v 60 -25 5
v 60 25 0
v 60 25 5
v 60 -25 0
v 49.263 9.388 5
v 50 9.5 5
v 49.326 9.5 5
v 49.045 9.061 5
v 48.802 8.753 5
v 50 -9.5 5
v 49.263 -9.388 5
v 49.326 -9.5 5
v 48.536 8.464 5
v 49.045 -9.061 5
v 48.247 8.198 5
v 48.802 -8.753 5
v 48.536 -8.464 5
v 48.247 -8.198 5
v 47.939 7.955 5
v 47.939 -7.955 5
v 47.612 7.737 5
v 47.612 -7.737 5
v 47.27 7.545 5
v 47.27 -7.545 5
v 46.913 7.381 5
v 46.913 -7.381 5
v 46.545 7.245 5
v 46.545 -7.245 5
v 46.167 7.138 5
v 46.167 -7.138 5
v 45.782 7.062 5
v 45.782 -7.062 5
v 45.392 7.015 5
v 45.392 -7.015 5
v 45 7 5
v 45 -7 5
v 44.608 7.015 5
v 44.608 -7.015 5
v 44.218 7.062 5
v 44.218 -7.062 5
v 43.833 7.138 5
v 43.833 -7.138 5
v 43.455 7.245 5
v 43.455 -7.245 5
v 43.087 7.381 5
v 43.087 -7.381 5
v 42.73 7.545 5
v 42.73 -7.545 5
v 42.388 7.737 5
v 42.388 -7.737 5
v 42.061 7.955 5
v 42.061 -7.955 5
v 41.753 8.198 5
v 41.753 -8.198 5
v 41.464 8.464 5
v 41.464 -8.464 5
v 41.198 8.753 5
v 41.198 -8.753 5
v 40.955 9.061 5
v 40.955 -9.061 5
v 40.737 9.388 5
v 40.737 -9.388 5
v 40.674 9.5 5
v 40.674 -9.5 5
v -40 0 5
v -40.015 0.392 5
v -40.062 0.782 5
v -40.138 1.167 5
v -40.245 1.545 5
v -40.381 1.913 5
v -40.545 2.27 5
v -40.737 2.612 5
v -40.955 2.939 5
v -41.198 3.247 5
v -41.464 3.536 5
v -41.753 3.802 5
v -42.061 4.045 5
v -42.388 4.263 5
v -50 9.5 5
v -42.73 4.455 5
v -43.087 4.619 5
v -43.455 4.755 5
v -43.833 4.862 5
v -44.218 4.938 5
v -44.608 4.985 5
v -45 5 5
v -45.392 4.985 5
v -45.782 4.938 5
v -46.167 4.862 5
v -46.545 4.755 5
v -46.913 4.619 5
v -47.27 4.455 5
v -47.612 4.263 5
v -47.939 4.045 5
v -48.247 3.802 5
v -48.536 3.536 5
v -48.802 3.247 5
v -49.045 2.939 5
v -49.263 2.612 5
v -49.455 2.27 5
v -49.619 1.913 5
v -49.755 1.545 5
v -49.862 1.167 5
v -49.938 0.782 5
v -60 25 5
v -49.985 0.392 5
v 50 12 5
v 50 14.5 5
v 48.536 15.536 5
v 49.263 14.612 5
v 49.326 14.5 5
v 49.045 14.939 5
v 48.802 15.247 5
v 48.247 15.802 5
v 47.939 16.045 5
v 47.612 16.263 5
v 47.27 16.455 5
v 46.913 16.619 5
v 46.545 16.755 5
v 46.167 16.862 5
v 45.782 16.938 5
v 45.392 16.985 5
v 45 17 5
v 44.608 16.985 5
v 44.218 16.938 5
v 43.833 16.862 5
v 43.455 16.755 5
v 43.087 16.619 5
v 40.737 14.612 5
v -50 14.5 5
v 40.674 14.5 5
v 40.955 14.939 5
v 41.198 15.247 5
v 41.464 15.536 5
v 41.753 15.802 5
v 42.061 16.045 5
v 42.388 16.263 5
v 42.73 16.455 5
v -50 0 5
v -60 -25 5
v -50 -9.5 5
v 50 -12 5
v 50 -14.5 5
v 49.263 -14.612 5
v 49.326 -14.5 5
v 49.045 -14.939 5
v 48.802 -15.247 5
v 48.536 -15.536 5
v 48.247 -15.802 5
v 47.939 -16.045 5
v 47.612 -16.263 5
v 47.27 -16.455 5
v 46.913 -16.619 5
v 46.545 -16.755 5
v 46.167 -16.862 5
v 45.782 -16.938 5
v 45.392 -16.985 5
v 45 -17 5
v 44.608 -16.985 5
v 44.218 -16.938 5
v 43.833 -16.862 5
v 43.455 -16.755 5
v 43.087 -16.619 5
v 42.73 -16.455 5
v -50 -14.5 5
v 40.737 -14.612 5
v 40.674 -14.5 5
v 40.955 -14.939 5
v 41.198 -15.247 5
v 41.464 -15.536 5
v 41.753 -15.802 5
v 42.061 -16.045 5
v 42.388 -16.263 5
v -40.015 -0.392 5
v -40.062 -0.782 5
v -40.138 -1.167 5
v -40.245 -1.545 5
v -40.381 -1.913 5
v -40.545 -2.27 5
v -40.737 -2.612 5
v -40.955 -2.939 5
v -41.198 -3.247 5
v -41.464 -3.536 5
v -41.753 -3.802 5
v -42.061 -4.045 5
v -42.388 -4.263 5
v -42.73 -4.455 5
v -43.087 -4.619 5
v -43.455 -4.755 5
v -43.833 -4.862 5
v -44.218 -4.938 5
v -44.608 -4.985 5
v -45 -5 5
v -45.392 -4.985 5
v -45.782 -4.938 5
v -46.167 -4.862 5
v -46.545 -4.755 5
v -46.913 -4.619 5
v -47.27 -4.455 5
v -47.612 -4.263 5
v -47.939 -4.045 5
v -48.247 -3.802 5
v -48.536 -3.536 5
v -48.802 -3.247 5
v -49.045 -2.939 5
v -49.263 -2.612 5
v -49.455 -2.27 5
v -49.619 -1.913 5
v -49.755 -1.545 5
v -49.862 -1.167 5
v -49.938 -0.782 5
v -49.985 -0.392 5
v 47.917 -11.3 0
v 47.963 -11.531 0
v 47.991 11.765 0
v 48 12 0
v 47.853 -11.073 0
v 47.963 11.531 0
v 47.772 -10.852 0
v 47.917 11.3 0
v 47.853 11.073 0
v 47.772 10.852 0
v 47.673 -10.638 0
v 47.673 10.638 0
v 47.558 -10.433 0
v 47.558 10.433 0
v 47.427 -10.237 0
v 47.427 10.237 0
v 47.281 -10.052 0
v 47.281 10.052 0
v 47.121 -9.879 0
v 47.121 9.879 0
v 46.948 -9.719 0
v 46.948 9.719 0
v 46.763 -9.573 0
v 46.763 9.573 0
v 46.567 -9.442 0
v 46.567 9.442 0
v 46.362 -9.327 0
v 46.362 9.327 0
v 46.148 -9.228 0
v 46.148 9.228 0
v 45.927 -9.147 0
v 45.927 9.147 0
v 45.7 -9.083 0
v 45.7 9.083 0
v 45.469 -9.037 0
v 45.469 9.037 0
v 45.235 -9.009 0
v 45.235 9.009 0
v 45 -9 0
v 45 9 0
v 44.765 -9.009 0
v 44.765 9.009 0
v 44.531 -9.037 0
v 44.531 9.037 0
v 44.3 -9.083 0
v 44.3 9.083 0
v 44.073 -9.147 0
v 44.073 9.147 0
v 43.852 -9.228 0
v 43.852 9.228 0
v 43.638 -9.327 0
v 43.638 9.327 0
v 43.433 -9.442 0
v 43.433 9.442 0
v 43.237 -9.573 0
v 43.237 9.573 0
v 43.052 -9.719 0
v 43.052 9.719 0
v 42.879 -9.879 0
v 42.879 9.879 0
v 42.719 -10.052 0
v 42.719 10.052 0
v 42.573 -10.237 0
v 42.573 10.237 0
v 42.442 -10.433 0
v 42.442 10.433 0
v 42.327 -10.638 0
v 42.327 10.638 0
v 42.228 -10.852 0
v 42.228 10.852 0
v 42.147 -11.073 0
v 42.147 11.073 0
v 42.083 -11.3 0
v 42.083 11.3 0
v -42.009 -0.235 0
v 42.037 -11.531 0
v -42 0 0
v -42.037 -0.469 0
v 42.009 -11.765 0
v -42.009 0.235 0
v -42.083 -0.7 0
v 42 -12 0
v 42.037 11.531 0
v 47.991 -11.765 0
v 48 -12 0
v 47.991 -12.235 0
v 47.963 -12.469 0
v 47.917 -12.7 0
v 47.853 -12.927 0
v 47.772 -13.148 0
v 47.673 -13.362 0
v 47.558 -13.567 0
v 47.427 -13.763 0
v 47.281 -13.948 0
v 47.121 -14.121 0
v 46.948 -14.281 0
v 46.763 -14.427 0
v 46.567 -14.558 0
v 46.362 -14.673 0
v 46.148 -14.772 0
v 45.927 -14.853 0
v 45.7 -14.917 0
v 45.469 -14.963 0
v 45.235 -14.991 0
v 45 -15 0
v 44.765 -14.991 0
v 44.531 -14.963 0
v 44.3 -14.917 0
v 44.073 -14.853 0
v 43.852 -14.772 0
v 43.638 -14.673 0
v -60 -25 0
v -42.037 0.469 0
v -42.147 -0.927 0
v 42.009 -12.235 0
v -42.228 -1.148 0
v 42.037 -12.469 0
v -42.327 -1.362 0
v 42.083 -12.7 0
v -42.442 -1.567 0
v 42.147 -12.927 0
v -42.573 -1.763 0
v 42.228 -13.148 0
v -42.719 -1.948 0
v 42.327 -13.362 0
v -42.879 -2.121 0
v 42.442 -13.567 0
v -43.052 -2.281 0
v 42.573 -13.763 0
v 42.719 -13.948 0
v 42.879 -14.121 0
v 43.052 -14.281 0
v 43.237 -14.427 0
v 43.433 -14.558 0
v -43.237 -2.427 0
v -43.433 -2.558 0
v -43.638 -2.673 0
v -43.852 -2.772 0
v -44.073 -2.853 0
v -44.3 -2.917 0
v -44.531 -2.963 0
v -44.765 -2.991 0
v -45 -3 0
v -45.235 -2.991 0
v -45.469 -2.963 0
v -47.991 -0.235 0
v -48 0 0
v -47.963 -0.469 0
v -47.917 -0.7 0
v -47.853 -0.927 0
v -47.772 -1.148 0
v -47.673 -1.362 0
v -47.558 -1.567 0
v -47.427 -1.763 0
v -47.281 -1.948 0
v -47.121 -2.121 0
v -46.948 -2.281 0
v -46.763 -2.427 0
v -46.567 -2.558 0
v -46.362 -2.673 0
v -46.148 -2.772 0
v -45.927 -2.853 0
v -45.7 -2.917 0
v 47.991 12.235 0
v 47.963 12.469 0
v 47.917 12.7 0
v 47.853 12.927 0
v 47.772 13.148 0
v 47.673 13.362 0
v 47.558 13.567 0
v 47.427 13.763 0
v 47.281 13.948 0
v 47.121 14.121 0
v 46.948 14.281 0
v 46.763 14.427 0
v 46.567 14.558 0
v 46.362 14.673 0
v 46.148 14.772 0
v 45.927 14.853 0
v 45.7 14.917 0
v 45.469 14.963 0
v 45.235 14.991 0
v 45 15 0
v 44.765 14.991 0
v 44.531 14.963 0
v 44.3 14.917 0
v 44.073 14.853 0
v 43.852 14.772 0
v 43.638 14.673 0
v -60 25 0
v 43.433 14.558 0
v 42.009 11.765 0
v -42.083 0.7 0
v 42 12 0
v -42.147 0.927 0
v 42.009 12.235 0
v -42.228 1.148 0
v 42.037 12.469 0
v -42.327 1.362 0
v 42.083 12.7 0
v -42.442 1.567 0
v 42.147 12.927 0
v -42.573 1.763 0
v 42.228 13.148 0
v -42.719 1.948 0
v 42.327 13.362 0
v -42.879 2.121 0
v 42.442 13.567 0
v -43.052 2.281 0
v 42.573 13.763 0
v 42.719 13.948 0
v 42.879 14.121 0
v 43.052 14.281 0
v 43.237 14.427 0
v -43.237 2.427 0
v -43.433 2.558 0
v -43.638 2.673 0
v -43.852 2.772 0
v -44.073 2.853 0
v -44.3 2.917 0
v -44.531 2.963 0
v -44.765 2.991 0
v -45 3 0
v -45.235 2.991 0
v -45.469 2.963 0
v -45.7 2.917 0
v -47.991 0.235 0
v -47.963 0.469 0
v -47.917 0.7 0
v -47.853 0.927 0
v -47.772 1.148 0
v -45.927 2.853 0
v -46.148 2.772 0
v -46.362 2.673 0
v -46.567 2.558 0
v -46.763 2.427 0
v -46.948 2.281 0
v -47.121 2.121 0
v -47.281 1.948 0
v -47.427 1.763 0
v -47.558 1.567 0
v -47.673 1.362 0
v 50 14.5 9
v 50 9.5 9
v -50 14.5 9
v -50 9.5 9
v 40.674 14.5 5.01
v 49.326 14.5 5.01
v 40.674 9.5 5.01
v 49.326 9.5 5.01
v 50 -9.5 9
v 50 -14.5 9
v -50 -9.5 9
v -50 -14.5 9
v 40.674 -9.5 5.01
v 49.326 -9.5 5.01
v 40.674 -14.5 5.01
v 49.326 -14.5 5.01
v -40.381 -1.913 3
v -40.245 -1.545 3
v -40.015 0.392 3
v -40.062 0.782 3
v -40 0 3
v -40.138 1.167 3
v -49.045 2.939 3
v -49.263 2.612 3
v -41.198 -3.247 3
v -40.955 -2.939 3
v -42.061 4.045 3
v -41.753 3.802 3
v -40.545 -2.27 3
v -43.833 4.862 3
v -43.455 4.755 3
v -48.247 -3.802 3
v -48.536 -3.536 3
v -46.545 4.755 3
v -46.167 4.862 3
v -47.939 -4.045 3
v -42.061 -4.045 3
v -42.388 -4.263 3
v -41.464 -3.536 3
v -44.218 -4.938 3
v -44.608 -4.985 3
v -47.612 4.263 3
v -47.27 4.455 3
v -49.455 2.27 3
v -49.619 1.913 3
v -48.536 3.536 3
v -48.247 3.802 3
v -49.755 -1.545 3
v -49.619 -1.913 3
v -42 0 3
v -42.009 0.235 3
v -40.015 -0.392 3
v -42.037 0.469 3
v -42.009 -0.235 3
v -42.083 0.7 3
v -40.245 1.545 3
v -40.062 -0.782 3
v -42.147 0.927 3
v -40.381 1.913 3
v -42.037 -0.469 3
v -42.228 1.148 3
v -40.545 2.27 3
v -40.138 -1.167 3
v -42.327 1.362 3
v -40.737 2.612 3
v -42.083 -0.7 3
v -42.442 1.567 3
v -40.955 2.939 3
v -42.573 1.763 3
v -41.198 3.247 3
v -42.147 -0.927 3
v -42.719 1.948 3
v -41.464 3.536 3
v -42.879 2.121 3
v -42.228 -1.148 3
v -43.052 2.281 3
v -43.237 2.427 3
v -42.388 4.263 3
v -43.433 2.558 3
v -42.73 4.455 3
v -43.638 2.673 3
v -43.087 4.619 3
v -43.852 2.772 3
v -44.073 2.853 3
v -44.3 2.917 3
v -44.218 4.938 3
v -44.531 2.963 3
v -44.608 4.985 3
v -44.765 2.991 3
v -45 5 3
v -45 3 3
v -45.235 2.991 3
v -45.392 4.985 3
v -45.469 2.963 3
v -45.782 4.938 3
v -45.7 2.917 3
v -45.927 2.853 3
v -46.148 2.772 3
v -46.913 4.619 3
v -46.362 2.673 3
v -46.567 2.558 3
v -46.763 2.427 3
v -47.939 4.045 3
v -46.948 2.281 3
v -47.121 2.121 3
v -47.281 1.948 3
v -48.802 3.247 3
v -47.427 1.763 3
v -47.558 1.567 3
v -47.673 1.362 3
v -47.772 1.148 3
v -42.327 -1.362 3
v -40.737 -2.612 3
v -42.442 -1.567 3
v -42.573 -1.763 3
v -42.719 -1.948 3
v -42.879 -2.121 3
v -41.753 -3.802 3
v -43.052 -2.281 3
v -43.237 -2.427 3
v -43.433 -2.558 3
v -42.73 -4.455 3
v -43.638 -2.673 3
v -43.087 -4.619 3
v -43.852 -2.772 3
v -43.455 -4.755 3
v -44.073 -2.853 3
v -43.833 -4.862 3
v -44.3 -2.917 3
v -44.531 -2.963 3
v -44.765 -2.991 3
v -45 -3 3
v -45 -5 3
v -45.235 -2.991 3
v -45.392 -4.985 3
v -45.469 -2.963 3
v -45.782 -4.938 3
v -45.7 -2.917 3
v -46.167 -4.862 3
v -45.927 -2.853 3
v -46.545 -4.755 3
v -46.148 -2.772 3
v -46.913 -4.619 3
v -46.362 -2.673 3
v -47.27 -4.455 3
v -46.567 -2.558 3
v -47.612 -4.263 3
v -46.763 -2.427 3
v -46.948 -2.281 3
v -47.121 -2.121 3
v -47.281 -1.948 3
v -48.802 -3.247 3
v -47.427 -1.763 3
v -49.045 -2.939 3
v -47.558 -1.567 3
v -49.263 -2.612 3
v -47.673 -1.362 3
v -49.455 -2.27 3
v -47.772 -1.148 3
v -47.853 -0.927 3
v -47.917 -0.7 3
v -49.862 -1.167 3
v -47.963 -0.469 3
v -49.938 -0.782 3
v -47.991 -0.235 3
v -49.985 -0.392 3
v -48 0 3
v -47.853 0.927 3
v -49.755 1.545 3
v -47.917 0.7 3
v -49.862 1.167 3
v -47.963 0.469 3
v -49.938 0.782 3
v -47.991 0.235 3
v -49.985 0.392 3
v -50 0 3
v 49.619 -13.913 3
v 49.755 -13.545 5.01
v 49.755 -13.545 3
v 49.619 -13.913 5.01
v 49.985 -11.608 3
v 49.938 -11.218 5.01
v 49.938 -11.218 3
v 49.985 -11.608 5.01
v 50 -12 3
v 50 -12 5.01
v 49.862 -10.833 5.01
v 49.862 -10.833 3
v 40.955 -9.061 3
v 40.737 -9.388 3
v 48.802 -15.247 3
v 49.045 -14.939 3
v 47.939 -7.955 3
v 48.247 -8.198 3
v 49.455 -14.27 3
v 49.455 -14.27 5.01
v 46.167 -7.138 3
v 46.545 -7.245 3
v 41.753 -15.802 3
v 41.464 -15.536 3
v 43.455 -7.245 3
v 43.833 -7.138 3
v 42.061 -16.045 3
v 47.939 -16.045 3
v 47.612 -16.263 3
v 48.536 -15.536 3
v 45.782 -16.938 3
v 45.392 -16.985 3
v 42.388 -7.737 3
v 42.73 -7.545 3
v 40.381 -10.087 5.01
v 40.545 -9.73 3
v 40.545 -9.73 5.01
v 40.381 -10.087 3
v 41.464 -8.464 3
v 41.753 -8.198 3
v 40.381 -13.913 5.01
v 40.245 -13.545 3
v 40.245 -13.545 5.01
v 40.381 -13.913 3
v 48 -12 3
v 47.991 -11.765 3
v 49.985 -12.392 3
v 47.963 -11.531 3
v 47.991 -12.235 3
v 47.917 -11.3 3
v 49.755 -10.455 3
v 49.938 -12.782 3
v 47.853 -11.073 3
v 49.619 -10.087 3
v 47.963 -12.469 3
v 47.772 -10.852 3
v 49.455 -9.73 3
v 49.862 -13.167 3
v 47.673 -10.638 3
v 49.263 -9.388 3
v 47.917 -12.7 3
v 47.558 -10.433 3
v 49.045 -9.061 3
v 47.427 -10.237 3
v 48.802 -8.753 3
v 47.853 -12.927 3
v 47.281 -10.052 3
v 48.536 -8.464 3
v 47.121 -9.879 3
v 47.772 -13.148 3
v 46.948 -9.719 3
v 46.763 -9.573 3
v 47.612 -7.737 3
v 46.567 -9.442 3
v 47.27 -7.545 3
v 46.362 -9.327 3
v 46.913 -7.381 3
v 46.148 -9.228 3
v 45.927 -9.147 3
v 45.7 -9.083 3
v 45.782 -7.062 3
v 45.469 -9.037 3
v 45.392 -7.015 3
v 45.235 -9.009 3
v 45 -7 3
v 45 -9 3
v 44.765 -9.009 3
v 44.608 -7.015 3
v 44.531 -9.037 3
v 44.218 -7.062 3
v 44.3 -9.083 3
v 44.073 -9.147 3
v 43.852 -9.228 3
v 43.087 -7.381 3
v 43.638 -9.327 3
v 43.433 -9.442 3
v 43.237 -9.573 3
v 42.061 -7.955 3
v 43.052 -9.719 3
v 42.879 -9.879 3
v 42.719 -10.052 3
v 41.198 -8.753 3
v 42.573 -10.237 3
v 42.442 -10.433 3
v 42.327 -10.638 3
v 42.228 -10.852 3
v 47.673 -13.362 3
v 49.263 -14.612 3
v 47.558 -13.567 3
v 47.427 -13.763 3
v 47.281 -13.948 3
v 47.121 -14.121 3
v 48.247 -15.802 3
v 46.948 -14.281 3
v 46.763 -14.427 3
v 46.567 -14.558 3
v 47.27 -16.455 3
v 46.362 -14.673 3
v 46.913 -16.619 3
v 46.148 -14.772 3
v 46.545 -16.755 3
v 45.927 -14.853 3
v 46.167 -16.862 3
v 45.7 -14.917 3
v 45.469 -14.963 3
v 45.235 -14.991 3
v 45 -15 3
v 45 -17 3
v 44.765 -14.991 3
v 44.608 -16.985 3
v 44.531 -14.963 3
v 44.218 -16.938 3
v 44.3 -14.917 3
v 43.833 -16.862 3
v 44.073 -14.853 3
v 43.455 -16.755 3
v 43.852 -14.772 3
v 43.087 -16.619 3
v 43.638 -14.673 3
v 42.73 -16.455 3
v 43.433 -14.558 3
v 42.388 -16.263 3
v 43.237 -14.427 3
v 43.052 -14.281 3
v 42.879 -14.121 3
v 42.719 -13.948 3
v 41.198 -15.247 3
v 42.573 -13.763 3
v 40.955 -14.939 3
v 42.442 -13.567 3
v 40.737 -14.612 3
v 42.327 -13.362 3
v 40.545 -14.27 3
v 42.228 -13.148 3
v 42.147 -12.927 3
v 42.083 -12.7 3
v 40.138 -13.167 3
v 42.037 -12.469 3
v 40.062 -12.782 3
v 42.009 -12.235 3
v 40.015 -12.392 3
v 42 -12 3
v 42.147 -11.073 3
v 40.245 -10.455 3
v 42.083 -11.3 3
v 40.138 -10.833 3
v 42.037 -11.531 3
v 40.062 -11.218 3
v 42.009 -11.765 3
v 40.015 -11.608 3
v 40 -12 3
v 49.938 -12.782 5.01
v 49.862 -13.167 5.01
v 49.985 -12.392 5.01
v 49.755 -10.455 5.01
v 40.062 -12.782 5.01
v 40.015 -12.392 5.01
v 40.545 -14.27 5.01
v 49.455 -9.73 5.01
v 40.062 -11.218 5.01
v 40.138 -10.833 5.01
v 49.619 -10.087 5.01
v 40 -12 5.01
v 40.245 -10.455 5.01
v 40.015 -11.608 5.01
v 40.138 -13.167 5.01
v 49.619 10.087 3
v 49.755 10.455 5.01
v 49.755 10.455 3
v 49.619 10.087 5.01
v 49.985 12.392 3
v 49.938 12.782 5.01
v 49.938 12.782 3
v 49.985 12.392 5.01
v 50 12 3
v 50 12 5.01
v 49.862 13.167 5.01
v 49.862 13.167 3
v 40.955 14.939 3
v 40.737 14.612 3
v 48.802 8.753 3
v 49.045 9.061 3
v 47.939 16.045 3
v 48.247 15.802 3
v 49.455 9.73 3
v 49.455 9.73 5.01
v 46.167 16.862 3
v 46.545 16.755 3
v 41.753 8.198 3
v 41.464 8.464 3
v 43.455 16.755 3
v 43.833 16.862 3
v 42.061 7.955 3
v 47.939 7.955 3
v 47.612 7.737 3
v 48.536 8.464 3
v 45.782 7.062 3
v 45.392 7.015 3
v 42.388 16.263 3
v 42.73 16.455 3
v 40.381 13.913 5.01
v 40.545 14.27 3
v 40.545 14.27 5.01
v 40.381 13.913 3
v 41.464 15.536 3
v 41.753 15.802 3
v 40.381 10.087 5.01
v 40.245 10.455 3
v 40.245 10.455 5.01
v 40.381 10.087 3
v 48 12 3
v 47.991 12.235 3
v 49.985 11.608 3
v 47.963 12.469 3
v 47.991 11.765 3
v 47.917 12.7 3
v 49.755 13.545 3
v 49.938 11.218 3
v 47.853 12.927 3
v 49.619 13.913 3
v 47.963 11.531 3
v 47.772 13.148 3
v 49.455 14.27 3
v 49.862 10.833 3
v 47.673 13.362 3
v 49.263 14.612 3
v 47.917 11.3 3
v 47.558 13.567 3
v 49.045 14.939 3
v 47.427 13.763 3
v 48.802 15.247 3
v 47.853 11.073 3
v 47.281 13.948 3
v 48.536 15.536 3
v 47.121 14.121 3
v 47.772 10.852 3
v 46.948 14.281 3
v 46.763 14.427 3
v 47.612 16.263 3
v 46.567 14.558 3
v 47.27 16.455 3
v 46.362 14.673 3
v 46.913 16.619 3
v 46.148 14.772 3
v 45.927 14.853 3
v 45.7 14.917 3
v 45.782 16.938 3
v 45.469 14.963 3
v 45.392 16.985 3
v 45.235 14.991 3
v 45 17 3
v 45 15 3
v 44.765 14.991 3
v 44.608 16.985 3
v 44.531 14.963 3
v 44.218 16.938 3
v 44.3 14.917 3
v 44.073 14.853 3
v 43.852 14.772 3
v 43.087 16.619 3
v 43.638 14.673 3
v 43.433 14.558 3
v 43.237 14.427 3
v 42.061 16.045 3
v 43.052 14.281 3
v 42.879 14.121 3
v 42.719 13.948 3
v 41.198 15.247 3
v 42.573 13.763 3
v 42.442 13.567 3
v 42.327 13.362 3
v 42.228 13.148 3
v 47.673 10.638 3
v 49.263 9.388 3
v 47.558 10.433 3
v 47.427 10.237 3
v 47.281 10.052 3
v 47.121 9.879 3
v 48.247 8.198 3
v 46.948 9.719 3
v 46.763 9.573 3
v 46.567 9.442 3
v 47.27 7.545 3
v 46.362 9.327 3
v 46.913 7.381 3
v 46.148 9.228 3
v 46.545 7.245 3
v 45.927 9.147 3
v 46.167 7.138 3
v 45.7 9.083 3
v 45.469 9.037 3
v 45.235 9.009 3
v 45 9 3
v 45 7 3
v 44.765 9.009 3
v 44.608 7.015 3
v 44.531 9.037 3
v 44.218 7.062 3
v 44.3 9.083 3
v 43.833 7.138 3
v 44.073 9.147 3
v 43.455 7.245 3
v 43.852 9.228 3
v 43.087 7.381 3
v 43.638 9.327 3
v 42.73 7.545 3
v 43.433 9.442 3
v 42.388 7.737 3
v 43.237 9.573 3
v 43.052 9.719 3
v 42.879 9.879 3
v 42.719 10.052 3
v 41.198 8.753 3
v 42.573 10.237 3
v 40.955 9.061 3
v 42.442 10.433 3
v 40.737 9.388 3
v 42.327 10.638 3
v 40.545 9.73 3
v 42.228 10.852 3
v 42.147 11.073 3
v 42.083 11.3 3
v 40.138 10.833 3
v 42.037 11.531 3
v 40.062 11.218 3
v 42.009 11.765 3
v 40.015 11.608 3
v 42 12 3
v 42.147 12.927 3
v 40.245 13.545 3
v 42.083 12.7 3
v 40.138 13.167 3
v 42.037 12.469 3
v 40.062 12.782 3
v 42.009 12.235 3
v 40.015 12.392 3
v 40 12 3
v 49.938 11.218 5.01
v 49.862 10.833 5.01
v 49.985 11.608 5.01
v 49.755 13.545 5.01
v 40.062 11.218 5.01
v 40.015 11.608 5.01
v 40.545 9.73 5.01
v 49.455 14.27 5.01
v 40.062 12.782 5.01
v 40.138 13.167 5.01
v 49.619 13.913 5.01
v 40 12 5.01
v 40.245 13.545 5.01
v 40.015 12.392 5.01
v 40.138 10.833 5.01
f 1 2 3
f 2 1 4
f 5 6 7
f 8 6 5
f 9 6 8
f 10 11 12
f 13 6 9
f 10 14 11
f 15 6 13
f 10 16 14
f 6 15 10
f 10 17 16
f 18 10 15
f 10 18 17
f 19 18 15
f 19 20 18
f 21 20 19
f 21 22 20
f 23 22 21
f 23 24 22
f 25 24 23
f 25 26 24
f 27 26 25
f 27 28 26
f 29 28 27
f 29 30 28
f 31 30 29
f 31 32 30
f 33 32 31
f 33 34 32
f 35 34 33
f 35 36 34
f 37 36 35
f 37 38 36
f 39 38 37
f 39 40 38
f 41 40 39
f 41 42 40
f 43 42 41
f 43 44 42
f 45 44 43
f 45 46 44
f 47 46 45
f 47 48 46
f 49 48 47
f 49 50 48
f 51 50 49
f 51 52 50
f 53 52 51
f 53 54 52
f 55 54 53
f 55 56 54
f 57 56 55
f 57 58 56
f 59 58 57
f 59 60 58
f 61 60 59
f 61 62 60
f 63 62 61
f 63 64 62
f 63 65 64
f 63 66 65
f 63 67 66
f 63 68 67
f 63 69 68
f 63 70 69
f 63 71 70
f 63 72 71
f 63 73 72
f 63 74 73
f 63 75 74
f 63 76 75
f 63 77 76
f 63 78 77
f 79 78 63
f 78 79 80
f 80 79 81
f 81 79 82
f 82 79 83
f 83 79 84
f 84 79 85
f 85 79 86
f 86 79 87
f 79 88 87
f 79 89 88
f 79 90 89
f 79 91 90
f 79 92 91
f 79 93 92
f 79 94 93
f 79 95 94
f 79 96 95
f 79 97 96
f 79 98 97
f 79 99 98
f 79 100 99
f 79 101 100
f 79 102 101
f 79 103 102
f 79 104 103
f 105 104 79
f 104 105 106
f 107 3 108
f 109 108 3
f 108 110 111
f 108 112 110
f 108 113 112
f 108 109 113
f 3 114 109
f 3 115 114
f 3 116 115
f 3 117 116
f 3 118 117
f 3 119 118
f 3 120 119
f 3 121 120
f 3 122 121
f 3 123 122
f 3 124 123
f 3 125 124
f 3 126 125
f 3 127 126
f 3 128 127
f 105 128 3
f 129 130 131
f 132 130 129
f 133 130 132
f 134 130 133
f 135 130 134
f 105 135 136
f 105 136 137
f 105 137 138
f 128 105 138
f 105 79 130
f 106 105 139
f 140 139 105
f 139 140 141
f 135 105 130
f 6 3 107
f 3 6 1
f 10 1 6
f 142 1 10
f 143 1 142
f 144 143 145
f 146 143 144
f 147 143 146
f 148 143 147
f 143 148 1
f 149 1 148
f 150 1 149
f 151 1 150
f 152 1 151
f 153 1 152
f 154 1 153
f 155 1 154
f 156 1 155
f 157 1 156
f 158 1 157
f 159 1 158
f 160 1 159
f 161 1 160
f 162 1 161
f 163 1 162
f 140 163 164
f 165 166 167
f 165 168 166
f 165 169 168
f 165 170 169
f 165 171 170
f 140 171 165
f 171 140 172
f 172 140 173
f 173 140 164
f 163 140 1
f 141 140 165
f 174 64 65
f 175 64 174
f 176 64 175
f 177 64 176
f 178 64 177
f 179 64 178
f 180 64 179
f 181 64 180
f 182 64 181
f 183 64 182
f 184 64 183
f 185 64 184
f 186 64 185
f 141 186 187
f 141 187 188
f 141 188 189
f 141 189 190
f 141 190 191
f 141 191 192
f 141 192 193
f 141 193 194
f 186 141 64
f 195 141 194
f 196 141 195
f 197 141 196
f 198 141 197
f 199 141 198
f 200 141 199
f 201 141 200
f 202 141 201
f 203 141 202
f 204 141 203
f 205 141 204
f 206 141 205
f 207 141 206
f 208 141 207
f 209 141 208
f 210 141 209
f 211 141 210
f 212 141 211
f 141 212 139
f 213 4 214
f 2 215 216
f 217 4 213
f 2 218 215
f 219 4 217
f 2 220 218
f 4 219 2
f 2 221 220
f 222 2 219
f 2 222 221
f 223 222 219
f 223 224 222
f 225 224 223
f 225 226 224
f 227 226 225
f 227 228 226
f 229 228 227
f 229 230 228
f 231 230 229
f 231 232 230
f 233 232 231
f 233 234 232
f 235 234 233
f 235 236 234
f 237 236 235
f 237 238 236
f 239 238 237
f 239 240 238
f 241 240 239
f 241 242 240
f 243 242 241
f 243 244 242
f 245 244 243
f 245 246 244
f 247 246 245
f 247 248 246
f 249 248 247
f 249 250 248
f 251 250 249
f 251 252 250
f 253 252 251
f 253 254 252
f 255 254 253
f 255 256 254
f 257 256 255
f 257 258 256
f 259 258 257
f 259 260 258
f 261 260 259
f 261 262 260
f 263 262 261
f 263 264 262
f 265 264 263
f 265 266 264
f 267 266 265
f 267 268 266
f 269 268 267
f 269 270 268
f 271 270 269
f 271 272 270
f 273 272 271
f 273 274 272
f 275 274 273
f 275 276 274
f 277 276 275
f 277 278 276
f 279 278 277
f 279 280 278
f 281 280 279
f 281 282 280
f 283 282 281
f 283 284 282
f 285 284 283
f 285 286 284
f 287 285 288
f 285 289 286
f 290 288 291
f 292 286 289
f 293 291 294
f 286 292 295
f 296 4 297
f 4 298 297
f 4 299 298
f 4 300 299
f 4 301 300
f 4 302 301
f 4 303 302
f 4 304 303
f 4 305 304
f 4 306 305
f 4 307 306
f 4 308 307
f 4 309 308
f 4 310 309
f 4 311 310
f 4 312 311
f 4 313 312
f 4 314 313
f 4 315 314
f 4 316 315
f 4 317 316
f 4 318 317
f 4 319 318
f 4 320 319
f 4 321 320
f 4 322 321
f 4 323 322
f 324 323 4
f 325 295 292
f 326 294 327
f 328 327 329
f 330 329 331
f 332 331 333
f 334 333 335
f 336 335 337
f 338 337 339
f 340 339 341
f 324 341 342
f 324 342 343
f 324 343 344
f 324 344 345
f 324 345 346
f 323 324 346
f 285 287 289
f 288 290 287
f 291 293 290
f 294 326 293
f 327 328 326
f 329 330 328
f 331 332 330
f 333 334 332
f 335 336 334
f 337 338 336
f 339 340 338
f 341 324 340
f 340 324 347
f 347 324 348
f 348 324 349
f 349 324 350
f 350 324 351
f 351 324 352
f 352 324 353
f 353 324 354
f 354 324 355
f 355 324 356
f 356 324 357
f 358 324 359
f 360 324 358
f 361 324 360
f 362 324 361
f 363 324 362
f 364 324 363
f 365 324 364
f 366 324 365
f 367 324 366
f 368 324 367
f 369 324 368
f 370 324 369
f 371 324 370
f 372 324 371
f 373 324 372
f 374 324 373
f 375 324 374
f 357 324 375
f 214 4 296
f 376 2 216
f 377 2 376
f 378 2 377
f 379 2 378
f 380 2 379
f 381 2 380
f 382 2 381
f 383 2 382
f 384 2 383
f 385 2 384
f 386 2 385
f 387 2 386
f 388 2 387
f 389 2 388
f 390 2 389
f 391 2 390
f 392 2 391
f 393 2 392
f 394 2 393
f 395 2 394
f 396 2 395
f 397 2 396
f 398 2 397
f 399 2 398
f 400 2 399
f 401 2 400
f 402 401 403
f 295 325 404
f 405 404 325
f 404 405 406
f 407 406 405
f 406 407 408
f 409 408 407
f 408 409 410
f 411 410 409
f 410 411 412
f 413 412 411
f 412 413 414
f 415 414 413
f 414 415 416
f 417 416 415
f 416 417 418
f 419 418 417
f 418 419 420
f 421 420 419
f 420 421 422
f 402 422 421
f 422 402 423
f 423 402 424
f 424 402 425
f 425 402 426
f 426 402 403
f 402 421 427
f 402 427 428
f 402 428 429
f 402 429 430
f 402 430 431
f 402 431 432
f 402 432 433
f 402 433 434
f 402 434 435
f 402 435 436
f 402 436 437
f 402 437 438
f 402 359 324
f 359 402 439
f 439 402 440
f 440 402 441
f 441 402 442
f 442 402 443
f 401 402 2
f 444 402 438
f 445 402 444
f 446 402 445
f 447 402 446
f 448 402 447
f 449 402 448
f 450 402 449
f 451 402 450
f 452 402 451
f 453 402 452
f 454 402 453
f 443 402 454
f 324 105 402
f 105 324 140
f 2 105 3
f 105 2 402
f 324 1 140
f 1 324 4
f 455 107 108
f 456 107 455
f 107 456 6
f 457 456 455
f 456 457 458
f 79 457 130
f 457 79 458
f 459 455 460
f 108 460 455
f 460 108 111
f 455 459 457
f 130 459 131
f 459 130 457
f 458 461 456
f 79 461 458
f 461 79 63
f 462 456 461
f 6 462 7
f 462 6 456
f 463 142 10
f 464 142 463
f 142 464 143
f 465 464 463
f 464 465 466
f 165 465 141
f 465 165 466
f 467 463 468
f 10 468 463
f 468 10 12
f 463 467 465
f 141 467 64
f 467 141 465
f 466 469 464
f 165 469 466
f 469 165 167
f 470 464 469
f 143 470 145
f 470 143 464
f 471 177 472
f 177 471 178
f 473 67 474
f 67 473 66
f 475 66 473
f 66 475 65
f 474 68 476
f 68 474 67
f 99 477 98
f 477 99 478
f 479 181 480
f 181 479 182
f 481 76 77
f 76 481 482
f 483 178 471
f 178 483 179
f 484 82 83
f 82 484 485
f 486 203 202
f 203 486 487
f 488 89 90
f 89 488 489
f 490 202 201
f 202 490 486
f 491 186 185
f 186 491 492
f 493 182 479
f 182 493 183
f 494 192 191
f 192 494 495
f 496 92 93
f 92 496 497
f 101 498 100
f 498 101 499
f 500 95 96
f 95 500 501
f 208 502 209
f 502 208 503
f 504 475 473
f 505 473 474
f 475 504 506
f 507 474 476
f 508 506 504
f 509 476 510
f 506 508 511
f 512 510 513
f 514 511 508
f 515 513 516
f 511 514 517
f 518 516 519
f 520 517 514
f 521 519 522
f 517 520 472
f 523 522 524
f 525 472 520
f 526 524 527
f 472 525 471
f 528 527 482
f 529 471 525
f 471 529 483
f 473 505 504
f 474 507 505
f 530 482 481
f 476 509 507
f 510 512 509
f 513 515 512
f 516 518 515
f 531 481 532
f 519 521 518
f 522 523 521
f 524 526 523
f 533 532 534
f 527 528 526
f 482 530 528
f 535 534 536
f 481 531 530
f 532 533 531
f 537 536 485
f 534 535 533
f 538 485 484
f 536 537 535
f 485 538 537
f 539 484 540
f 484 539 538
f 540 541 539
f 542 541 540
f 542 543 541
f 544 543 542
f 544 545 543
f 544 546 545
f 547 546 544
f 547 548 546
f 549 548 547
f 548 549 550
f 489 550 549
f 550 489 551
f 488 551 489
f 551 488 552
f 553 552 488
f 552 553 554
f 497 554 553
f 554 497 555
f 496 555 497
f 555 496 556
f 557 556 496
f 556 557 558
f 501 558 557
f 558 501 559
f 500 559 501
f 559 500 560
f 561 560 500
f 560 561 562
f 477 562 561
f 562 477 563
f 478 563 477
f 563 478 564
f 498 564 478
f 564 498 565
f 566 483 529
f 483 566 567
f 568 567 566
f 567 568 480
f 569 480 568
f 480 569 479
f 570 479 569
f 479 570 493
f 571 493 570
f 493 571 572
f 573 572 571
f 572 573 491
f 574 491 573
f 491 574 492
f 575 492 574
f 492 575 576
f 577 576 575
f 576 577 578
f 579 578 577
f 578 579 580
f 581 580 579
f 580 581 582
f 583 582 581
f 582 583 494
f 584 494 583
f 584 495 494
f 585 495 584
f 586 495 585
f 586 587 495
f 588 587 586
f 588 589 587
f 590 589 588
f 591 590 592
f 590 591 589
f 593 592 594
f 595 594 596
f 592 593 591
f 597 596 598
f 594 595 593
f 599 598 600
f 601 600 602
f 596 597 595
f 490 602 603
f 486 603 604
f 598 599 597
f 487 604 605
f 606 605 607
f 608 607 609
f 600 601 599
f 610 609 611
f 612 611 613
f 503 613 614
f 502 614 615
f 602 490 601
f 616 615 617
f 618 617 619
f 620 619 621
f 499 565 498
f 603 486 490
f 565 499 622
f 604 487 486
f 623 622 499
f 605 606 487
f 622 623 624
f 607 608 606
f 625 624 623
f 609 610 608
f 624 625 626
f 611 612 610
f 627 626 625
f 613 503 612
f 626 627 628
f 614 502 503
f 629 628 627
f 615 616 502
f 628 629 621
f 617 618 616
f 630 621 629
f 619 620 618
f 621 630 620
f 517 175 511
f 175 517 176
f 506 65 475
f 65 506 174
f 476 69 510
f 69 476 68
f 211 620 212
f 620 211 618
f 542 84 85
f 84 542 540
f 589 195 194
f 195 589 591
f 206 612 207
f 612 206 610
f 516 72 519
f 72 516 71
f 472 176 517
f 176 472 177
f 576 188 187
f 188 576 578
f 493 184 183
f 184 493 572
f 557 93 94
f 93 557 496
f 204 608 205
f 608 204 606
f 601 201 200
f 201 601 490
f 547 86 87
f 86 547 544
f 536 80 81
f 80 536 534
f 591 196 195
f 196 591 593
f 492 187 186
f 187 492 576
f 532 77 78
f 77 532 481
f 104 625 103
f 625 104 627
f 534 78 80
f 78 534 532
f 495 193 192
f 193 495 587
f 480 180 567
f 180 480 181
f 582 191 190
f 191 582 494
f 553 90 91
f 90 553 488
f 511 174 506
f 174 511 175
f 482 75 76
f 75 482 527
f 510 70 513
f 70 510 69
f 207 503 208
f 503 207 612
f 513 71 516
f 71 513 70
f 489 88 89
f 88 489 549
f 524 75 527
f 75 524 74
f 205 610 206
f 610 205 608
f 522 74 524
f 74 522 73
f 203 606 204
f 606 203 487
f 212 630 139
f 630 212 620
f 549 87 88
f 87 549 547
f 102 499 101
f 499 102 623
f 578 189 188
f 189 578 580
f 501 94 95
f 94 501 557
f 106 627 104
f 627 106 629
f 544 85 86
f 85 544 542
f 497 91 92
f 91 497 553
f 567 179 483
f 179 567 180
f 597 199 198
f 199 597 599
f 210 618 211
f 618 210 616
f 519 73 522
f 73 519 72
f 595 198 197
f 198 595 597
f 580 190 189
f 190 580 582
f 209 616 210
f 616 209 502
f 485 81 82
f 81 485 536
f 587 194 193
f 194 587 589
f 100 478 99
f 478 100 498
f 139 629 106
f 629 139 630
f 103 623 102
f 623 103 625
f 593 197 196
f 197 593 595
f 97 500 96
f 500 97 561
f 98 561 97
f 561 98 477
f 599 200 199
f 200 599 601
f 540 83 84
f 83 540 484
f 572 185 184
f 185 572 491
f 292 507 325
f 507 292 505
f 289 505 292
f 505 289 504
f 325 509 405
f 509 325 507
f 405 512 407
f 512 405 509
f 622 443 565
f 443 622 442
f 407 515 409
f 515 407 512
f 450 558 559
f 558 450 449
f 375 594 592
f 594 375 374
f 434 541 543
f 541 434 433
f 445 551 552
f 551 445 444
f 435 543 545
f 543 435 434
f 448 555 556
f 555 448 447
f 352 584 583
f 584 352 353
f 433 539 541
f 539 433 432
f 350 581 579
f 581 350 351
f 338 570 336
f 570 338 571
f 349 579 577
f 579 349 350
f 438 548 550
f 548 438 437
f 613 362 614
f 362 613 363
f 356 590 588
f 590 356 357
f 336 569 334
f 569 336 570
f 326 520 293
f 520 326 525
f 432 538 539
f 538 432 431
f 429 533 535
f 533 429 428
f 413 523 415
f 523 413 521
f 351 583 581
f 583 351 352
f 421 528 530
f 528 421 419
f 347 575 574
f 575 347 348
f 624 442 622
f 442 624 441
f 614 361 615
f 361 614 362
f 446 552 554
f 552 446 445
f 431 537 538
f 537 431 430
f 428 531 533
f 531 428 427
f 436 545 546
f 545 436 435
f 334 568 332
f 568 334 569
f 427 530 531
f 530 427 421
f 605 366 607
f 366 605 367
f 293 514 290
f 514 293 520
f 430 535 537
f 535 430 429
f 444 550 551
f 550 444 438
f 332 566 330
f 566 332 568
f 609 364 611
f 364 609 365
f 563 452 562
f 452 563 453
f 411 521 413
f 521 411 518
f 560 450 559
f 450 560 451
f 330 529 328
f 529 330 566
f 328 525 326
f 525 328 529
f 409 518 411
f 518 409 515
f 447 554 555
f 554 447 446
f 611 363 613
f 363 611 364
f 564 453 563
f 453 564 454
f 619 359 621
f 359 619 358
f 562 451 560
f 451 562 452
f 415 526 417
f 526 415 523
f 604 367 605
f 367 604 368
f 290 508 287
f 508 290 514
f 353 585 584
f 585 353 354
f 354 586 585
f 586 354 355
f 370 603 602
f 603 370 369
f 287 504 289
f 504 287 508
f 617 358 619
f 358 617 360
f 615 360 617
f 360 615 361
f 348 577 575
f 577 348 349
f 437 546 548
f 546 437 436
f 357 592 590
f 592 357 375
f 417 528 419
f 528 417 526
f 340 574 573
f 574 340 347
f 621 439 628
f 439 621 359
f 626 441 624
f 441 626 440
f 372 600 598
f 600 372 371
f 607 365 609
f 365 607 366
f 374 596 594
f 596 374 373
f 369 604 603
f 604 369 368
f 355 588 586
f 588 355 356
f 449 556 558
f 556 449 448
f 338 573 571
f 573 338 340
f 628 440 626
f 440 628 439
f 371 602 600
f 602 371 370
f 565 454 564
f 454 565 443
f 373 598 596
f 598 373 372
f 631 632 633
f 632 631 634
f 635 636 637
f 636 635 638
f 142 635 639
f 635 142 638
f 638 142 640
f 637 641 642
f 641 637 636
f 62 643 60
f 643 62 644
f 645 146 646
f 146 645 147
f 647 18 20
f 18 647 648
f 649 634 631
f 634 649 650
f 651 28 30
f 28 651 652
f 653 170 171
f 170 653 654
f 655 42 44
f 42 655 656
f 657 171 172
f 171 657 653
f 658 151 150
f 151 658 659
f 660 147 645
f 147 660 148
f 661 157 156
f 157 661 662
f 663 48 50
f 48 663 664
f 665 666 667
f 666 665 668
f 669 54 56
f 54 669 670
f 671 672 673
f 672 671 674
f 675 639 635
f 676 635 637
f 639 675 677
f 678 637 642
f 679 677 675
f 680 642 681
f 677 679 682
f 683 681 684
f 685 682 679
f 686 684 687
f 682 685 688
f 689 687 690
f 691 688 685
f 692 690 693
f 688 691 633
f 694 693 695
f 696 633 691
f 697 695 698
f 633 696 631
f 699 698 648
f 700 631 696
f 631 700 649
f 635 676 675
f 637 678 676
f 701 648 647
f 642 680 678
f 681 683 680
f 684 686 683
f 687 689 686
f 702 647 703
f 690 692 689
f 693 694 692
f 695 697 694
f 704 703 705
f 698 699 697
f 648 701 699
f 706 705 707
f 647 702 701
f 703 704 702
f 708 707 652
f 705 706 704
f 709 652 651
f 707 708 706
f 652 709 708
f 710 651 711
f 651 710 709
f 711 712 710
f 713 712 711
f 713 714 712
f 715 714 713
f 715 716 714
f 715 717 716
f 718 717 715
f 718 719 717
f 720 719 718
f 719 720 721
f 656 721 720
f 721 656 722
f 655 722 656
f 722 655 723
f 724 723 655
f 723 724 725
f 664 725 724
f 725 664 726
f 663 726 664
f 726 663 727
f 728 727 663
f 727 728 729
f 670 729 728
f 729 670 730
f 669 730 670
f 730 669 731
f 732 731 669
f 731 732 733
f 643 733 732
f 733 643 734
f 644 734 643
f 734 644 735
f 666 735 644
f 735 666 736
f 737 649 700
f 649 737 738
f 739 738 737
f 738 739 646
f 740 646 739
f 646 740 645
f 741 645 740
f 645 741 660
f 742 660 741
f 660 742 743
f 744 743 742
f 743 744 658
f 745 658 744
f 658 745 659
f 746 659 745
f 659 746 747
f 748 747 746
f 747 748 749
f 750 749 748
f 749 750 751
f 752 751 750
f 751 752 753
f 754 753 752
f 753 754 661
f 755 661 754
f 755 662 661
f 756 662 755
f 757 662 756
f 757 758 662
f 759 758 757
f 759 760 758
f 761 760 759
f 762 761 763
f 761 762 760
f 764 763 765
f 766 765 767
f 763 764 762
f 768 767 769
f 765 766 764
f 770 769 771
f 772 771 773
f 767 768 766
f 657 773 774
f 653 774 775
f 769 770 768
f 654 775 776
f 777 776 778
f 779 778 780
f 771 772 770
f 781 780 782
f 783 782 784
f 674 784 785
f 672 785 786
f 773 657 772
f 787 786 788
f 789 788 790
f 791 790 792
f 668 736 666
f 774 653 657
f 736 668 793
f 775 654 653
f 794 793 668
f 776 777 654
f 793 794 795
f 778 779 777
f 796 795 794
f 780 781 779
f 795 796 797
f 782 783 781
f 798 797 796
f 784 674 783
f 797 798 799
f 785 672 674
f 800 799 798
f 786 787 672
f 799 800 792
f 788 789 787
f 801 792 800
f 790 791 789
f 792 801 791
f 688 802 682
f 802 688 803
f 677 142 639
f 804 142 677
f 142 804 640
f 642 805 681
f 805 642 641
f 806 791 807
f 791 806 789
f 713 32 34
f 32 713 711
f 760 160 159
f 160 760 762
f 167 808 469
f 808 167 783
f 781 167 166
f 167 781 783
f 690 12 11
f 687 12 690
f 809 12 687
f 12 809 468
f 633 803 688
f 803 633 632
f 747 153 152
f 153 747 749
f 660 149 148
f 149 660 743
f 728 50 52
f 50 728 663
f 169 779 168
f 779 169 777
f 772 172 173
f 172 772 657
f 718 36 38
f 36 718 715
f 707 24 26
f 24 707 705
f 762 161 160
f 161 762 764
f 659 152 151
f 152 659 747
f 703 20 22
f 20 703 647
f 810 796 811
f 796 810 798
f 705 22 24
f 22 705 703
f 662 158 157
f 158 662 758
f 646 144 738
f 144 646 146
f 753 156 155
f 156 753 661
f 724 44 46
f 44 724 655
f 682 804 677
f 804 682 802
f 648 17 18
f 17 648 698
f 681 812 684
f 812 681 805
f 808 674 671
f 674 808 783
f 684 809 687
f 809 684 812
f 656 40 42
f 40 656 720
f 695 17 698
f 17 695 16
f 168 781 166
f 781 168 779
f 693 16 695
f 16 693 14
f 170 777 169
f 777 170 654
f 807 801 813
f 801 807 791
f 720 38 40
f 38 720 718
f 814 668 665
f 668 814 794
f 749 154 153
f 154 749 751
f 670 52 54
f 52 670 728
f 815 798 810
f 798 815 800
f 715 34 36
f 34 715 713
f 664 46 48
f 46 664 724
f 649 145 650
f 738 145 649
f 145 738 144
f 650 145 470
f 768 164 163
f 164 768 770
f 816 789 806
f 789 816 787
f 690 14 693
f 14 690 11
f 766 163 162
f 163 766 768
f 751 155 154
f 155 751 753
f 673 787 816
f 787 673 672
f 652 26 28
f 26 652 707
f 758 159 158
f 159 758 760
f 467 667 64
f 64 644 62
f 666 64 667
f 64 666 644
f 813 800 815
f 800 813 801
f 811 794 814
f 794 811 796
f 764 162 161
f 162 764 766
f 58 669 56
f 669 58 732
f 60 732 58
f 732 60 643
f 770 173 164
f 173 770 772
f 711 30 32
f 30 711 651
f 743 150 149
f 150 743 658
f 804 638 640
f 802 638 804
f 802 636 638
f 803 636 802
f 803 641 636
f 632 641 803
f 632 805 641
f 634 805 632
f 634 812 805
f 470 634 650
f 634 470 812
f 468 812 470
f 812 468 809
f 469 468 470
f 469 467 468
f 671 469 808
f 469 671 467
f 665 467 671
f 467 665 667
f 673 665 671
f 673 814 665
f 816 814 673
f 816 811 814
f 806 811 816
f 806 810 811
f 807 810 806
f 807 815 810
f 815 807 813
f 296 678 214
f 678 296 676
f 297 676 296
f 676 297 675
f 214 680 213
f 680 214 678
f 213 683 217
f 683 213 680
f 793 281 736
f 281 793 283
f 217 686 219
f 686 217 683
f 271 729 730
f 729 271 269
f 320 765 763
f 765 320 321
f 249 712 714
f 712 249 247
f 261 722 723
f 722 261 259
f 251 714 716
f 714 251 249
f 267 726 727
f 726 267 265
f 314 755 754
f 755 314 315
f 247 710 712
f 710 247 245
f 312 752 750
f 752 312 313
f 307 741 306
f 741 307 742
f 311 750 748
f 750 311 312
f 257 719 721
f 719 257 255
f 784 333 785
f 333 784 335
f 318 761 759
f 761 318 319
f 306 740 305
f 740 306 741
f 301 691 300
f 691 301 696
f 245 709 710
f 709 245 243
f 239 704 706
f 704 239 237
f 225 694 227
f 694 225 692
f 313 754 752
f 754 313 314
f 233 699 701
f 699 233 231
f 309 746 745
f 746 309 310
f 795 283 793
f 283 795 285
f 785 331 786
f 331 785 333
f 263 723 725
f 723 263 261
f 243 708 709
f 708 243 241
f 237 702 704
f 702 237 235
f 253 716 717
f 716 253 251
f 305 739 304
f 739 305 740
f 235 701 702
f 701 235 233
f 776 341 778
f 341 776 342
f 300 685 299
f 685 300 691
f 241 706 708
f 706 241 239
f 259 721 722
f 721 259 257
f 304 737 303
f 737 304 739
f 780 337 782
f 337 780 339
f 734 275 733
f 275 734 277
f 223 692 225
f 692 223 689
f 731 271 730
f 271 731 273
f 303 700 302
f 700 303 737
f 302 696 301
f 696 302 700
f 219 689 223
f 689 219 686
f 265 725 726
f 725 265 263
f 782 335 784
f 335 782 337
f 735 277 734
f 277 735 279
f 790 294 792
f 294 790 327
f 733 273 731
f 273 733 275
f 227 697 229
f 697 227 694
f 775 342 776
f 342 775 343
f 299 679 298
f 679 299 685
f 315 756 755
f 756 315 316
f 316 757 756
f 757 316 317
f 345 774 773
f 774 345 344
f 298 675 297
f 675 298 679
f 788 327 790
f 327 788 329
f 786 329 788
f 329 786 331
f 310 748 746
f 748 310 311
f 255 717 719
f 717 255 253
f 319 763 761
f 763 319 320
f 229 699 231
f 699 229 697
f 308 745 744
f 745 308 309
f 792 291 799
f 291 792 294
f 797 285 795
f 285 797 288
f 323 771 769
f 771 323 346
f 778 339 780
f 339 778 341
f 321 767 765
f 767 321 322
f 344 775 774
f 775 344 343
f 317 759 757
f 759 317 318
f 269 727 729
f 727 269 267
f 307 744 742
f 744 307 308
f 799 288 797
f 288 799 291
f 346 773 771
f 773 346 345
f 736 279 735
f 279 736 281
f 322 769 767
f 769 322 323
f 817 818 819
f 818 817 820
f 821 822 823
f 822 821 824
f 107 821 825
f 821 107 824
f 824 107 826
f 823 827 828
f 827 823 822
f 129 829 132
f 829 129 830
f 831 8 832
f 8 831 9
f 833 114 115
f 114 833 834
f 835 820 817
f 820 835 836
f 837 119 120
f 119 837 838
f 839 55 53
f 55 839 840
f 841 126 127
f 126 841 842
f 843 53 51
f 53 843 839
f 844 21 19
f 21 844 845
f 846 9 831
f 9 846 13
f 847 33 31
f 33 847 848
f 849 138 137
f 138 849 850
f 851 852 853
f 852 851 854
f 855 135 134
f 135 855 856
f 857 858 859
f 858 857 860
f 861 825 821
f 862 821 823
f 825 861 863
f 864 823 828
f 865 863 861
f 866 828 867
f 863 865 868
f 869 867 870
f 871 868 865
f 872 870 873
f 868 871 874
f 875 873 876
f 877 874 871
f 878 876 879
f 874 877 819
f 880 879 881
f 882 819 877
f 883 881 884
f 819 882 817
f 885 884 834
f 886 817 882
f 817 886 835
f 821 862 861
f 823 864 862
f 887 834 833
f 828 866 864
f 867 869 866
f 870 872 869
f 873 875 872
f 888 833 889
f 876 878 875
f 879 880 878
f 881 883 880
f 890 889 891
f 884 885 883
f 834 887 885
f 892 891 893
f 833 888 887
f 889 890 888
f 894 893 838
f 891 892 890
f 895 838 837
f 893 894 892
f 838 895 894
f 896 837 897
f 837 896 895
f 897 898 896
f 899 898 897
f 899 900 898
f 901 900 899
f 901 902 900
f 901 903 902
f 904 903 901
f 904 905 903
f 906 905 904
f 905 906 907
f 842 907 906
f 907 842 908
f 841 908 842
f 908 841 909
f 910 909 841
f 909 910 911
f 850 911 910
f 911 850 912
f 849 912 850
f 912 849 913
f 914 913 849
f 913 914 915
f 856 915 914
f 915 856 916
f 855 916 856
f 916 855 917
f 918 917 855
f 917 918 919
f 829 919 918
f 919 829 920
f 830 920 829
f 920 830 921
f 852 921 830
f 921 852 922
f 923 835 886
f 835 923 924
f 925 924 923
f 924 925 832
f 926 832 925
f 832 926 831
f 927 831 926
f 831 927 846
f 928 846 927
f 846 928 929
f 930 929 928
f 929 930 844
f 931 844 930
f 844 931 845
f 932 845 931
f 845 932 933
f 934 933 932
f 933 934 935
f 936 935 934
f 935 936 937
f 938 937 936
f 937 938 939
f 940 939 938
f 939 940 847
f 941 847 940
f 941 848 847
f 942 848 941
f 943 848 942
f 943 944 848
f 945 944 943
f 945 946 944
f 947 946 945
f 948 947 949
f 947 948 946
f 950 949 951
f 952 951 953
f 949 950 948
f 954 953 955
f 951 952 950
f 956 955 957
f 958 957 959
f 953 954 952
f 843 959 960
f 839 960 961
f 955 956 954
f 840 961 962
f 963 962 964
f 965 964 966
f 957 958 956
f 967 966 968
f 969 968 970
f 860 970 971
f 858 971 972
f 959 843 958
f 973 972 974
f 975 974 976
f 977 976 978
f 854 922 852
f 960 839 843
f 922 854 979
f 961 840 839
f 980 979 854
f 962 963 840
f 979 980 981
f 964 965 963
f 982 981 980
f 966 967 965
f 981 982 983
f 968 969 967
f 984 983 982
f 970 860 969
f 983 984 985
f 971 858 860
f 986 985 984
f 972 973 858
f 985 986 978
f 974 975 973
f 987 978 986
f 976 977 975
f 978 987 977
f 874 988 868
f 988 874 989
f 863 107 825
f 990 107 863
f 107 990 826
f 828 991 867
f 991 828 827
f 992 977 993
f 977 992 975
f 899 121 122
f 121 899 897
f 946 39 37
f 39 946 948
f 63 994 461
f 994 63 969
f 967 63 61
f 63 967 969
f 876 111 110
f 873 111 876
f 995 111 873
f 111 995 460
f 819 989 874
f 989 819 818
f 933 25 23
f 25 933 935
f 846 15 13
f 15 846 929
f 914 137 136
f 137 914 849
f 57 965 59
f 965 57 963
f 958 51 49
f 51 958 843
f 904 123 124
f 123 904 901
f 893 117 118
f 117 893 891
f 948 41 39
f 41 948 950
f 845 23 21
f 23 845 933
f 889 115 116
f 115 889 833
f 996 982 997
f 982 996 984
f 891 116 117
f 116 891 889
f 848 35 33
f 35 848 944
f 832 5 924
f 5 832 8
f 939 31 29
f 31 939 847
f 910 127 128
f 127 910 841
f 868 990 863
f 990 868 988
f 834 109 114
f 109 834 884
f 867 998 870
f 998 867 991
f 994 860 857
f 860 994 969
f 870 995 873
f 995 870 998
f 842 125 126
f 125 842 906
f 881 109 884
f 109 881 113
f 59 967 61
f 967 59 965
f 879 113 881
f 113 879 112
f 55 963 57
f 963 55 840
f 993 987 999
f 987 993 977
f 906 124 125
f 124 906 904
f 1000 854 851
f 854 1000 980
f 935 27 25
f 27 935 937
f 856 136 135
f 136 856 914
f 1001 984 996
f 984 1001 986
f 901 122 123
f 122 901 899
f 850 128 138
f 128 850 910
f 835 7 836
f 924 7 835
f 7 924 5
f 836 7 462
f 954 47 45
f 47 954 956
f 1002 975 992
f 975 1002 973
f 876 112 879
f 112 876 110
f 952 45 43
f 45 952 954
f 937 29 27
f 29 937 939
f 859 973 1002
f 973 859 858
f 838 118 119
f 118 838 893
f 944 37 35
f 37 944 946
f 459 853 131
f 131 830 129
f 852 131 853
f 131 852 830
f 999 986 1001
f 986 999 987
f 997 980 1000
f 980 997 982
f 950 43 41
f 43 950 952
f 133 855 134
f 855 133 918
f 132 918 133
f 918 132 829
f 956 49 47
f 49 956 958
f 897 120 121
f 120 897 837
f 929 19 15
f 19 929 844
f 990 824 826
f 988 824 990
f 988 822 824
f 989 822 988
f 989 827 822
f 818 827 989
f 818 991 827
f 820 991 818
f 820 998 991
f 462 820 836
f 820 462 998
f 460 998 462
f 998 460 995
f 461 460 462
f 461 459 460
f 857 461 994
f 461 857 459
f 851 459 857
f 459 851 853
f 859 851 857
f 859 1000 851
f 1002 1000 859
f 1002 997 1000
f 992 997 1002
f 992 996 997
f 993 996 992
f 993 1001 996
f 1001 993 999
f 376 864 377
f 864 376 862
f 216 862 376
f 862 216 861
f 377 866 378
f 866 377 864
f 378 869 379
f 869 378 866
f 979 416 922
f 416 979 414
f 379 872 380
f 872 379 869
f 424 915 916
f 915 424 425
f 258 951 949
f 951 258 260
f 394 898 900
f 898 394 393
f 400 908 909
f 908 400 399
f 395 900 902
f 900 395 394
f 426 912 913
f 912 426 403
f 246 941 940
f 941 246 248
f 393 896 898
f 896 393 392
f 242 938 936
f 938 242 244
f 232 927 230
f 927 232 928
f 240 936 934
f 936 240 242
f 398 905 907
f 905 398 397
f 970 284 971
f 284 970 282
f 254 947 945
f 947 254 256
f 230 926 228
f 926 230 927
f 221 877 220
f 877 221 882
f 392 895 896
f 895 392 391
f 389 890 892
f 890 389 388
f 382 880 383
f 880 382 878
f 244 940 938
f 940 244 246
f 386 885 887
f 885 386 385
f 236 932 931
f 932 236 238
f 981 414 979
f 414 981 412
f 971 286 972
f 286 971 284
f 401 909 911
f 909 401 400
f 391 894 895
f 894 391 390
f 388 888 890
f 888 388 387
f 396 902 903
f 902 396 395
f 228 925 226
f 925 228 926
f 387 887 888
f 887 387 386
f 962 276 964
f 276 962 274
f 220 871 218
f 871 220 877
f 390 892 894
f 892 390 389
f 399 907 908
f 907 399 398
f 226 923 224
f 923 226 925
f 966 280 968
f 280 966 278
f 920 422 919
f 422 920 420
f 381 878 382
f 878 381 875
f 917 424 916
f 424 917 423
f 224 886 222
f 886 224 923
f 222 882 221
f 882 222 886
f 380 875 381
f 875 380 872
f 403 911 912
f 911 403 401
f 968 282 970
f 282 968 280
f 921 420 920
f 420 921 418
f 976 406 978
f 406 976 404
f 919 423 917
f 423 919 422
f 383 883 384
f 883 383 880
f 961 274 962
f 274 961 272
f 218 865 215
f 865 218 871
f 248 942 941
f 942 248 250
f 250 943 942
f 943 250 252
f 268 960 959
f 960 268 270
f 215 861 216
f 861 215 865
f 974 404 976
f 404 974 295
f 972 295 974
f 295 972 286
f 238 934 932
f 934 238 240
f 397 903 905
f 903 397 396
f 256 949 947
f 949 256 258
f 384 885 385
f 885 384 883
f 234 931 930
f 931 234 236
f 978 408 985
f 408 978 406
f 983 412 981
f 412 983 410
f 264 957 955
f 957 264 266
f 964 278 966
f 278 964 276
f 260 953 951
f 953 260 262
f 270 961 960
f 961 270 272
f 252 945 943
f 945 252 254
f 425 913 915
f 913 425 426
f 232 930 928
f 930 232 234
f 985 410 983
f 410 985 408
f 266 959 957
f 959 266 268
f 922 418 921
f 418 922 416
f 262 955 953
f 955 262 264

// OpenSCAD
// Parametric Rectangular Base with Ribs and Stepped Holes

// === Base Plate Parameters ===
base_length = 120;        // Length of the rectangular base (X)
base_width = 50;          // Width of the rectangular base (Y)
base_thickness = 5;       // Thickness of the base plate (Z)

// === Rib Parameters ===
rib_length = 100;         // Length of each rib along X
rib_width = 5;            // Width of each rib (Y)
rib_height = 4;           // Height of ribs above base top surface
rib_offset_y = 12;        // Distance from centerline to each rib center
rib_offset_x = 0;        // X offset for centering ribs on base

// === Hole Parameters (stepped counterbore style) ===
hole_diameter_upper = 10; // Diameter of the shallow upper recess
hole_depth_upper = 2;     // Depth of the upper recess from top surface
hole_diameter_lower = 6;  // Diameter of the deeper through hole
hole_depth_lower = base_thickness; // Lower hole goes through the base

// === Hole Positions (X, Y relative to base center) ===
// Three holes near the ends of the plate
hole1_pos = [-45, 0];    // Near left end, centered
hole2_pos = [45, -12];   // Near right end, lower
hole3_pos = [45, 12];    // Near right end, upper

// === Resolution ===
$fn = 80;

// --- Module: Stepped Hole (counterbore) ---
// Creates a stepped circular cut with shallow recess on top
// and a deeper narrower hole below
module stepped_hole(d_upper, depth_upper, d_lower, depth_lower) {
    union() {
        // Upper shallow recess (wider)
        translate([0, 0, -depth_upper])
            cylinder(h = depth_upper + 0.01, d = d_upper);
        // Lower deeper hole (narrower), extends down from top surface
        translate([0, 0, -depth_lower - 0.01])
            cylinder(h = depth_lower + 0.02, d = d_lower);
    }
}

// --- Module: Rib ---
// A solid raised rectangular rib on top of the base
module rib(length, width, height) {
    cube([length, width, height], center = false);
}

// --- Main Assembly ---
difference() {
    union() {
        // Base plate centered at origin in XY, bottom at Z=0
        translate([-base_length/2, -base_width/2, 0])
            cube([base_length, base_width, base_thickness]);

        // Rib 1 - offset in +Y direction, on top of base
        translate([-rib_length/2 + rib_offset_x, rib_offset_y - rib_width/2, base_thickness])
            rib(rib_length, rib_width, rib_height);

        // Rib 2 - offset in -Y direction, on top of base
        translate([-rib_length/2 + rib_offset_x, -rib_offset_y - rib_width/2, base_thickness])
            rib(rib_length, rib_width, rib_height);
    }

    // Stepped holes - cut from the top surface of the base
    // Hole 1: near left end
    translate([hole1_pos[0], hole1_pos[1], base_thickness])
        stepped_hole(hole_diameter_upper, hole_depth_upper,
                     hole_diameter_lower, hole_depth_lower);

    // Hole 2: near right end, lower position
    translate([hole2_pos[0], hole2_pos[1], base_thickness])
        stepped_hole(hole_diameter_upper, hole_depth_upper,
                     hole_diameter_lower, hole_depth_lower);

    // Hole 3: near right end, upper position
    translate([hole3_pos[0], hole3_pos[1], base_thickness])
        stepped_hole(hole_diameter_upper, hole_depth_upper,
                     hole_diameter_lower, hole_depth_lower);
}
